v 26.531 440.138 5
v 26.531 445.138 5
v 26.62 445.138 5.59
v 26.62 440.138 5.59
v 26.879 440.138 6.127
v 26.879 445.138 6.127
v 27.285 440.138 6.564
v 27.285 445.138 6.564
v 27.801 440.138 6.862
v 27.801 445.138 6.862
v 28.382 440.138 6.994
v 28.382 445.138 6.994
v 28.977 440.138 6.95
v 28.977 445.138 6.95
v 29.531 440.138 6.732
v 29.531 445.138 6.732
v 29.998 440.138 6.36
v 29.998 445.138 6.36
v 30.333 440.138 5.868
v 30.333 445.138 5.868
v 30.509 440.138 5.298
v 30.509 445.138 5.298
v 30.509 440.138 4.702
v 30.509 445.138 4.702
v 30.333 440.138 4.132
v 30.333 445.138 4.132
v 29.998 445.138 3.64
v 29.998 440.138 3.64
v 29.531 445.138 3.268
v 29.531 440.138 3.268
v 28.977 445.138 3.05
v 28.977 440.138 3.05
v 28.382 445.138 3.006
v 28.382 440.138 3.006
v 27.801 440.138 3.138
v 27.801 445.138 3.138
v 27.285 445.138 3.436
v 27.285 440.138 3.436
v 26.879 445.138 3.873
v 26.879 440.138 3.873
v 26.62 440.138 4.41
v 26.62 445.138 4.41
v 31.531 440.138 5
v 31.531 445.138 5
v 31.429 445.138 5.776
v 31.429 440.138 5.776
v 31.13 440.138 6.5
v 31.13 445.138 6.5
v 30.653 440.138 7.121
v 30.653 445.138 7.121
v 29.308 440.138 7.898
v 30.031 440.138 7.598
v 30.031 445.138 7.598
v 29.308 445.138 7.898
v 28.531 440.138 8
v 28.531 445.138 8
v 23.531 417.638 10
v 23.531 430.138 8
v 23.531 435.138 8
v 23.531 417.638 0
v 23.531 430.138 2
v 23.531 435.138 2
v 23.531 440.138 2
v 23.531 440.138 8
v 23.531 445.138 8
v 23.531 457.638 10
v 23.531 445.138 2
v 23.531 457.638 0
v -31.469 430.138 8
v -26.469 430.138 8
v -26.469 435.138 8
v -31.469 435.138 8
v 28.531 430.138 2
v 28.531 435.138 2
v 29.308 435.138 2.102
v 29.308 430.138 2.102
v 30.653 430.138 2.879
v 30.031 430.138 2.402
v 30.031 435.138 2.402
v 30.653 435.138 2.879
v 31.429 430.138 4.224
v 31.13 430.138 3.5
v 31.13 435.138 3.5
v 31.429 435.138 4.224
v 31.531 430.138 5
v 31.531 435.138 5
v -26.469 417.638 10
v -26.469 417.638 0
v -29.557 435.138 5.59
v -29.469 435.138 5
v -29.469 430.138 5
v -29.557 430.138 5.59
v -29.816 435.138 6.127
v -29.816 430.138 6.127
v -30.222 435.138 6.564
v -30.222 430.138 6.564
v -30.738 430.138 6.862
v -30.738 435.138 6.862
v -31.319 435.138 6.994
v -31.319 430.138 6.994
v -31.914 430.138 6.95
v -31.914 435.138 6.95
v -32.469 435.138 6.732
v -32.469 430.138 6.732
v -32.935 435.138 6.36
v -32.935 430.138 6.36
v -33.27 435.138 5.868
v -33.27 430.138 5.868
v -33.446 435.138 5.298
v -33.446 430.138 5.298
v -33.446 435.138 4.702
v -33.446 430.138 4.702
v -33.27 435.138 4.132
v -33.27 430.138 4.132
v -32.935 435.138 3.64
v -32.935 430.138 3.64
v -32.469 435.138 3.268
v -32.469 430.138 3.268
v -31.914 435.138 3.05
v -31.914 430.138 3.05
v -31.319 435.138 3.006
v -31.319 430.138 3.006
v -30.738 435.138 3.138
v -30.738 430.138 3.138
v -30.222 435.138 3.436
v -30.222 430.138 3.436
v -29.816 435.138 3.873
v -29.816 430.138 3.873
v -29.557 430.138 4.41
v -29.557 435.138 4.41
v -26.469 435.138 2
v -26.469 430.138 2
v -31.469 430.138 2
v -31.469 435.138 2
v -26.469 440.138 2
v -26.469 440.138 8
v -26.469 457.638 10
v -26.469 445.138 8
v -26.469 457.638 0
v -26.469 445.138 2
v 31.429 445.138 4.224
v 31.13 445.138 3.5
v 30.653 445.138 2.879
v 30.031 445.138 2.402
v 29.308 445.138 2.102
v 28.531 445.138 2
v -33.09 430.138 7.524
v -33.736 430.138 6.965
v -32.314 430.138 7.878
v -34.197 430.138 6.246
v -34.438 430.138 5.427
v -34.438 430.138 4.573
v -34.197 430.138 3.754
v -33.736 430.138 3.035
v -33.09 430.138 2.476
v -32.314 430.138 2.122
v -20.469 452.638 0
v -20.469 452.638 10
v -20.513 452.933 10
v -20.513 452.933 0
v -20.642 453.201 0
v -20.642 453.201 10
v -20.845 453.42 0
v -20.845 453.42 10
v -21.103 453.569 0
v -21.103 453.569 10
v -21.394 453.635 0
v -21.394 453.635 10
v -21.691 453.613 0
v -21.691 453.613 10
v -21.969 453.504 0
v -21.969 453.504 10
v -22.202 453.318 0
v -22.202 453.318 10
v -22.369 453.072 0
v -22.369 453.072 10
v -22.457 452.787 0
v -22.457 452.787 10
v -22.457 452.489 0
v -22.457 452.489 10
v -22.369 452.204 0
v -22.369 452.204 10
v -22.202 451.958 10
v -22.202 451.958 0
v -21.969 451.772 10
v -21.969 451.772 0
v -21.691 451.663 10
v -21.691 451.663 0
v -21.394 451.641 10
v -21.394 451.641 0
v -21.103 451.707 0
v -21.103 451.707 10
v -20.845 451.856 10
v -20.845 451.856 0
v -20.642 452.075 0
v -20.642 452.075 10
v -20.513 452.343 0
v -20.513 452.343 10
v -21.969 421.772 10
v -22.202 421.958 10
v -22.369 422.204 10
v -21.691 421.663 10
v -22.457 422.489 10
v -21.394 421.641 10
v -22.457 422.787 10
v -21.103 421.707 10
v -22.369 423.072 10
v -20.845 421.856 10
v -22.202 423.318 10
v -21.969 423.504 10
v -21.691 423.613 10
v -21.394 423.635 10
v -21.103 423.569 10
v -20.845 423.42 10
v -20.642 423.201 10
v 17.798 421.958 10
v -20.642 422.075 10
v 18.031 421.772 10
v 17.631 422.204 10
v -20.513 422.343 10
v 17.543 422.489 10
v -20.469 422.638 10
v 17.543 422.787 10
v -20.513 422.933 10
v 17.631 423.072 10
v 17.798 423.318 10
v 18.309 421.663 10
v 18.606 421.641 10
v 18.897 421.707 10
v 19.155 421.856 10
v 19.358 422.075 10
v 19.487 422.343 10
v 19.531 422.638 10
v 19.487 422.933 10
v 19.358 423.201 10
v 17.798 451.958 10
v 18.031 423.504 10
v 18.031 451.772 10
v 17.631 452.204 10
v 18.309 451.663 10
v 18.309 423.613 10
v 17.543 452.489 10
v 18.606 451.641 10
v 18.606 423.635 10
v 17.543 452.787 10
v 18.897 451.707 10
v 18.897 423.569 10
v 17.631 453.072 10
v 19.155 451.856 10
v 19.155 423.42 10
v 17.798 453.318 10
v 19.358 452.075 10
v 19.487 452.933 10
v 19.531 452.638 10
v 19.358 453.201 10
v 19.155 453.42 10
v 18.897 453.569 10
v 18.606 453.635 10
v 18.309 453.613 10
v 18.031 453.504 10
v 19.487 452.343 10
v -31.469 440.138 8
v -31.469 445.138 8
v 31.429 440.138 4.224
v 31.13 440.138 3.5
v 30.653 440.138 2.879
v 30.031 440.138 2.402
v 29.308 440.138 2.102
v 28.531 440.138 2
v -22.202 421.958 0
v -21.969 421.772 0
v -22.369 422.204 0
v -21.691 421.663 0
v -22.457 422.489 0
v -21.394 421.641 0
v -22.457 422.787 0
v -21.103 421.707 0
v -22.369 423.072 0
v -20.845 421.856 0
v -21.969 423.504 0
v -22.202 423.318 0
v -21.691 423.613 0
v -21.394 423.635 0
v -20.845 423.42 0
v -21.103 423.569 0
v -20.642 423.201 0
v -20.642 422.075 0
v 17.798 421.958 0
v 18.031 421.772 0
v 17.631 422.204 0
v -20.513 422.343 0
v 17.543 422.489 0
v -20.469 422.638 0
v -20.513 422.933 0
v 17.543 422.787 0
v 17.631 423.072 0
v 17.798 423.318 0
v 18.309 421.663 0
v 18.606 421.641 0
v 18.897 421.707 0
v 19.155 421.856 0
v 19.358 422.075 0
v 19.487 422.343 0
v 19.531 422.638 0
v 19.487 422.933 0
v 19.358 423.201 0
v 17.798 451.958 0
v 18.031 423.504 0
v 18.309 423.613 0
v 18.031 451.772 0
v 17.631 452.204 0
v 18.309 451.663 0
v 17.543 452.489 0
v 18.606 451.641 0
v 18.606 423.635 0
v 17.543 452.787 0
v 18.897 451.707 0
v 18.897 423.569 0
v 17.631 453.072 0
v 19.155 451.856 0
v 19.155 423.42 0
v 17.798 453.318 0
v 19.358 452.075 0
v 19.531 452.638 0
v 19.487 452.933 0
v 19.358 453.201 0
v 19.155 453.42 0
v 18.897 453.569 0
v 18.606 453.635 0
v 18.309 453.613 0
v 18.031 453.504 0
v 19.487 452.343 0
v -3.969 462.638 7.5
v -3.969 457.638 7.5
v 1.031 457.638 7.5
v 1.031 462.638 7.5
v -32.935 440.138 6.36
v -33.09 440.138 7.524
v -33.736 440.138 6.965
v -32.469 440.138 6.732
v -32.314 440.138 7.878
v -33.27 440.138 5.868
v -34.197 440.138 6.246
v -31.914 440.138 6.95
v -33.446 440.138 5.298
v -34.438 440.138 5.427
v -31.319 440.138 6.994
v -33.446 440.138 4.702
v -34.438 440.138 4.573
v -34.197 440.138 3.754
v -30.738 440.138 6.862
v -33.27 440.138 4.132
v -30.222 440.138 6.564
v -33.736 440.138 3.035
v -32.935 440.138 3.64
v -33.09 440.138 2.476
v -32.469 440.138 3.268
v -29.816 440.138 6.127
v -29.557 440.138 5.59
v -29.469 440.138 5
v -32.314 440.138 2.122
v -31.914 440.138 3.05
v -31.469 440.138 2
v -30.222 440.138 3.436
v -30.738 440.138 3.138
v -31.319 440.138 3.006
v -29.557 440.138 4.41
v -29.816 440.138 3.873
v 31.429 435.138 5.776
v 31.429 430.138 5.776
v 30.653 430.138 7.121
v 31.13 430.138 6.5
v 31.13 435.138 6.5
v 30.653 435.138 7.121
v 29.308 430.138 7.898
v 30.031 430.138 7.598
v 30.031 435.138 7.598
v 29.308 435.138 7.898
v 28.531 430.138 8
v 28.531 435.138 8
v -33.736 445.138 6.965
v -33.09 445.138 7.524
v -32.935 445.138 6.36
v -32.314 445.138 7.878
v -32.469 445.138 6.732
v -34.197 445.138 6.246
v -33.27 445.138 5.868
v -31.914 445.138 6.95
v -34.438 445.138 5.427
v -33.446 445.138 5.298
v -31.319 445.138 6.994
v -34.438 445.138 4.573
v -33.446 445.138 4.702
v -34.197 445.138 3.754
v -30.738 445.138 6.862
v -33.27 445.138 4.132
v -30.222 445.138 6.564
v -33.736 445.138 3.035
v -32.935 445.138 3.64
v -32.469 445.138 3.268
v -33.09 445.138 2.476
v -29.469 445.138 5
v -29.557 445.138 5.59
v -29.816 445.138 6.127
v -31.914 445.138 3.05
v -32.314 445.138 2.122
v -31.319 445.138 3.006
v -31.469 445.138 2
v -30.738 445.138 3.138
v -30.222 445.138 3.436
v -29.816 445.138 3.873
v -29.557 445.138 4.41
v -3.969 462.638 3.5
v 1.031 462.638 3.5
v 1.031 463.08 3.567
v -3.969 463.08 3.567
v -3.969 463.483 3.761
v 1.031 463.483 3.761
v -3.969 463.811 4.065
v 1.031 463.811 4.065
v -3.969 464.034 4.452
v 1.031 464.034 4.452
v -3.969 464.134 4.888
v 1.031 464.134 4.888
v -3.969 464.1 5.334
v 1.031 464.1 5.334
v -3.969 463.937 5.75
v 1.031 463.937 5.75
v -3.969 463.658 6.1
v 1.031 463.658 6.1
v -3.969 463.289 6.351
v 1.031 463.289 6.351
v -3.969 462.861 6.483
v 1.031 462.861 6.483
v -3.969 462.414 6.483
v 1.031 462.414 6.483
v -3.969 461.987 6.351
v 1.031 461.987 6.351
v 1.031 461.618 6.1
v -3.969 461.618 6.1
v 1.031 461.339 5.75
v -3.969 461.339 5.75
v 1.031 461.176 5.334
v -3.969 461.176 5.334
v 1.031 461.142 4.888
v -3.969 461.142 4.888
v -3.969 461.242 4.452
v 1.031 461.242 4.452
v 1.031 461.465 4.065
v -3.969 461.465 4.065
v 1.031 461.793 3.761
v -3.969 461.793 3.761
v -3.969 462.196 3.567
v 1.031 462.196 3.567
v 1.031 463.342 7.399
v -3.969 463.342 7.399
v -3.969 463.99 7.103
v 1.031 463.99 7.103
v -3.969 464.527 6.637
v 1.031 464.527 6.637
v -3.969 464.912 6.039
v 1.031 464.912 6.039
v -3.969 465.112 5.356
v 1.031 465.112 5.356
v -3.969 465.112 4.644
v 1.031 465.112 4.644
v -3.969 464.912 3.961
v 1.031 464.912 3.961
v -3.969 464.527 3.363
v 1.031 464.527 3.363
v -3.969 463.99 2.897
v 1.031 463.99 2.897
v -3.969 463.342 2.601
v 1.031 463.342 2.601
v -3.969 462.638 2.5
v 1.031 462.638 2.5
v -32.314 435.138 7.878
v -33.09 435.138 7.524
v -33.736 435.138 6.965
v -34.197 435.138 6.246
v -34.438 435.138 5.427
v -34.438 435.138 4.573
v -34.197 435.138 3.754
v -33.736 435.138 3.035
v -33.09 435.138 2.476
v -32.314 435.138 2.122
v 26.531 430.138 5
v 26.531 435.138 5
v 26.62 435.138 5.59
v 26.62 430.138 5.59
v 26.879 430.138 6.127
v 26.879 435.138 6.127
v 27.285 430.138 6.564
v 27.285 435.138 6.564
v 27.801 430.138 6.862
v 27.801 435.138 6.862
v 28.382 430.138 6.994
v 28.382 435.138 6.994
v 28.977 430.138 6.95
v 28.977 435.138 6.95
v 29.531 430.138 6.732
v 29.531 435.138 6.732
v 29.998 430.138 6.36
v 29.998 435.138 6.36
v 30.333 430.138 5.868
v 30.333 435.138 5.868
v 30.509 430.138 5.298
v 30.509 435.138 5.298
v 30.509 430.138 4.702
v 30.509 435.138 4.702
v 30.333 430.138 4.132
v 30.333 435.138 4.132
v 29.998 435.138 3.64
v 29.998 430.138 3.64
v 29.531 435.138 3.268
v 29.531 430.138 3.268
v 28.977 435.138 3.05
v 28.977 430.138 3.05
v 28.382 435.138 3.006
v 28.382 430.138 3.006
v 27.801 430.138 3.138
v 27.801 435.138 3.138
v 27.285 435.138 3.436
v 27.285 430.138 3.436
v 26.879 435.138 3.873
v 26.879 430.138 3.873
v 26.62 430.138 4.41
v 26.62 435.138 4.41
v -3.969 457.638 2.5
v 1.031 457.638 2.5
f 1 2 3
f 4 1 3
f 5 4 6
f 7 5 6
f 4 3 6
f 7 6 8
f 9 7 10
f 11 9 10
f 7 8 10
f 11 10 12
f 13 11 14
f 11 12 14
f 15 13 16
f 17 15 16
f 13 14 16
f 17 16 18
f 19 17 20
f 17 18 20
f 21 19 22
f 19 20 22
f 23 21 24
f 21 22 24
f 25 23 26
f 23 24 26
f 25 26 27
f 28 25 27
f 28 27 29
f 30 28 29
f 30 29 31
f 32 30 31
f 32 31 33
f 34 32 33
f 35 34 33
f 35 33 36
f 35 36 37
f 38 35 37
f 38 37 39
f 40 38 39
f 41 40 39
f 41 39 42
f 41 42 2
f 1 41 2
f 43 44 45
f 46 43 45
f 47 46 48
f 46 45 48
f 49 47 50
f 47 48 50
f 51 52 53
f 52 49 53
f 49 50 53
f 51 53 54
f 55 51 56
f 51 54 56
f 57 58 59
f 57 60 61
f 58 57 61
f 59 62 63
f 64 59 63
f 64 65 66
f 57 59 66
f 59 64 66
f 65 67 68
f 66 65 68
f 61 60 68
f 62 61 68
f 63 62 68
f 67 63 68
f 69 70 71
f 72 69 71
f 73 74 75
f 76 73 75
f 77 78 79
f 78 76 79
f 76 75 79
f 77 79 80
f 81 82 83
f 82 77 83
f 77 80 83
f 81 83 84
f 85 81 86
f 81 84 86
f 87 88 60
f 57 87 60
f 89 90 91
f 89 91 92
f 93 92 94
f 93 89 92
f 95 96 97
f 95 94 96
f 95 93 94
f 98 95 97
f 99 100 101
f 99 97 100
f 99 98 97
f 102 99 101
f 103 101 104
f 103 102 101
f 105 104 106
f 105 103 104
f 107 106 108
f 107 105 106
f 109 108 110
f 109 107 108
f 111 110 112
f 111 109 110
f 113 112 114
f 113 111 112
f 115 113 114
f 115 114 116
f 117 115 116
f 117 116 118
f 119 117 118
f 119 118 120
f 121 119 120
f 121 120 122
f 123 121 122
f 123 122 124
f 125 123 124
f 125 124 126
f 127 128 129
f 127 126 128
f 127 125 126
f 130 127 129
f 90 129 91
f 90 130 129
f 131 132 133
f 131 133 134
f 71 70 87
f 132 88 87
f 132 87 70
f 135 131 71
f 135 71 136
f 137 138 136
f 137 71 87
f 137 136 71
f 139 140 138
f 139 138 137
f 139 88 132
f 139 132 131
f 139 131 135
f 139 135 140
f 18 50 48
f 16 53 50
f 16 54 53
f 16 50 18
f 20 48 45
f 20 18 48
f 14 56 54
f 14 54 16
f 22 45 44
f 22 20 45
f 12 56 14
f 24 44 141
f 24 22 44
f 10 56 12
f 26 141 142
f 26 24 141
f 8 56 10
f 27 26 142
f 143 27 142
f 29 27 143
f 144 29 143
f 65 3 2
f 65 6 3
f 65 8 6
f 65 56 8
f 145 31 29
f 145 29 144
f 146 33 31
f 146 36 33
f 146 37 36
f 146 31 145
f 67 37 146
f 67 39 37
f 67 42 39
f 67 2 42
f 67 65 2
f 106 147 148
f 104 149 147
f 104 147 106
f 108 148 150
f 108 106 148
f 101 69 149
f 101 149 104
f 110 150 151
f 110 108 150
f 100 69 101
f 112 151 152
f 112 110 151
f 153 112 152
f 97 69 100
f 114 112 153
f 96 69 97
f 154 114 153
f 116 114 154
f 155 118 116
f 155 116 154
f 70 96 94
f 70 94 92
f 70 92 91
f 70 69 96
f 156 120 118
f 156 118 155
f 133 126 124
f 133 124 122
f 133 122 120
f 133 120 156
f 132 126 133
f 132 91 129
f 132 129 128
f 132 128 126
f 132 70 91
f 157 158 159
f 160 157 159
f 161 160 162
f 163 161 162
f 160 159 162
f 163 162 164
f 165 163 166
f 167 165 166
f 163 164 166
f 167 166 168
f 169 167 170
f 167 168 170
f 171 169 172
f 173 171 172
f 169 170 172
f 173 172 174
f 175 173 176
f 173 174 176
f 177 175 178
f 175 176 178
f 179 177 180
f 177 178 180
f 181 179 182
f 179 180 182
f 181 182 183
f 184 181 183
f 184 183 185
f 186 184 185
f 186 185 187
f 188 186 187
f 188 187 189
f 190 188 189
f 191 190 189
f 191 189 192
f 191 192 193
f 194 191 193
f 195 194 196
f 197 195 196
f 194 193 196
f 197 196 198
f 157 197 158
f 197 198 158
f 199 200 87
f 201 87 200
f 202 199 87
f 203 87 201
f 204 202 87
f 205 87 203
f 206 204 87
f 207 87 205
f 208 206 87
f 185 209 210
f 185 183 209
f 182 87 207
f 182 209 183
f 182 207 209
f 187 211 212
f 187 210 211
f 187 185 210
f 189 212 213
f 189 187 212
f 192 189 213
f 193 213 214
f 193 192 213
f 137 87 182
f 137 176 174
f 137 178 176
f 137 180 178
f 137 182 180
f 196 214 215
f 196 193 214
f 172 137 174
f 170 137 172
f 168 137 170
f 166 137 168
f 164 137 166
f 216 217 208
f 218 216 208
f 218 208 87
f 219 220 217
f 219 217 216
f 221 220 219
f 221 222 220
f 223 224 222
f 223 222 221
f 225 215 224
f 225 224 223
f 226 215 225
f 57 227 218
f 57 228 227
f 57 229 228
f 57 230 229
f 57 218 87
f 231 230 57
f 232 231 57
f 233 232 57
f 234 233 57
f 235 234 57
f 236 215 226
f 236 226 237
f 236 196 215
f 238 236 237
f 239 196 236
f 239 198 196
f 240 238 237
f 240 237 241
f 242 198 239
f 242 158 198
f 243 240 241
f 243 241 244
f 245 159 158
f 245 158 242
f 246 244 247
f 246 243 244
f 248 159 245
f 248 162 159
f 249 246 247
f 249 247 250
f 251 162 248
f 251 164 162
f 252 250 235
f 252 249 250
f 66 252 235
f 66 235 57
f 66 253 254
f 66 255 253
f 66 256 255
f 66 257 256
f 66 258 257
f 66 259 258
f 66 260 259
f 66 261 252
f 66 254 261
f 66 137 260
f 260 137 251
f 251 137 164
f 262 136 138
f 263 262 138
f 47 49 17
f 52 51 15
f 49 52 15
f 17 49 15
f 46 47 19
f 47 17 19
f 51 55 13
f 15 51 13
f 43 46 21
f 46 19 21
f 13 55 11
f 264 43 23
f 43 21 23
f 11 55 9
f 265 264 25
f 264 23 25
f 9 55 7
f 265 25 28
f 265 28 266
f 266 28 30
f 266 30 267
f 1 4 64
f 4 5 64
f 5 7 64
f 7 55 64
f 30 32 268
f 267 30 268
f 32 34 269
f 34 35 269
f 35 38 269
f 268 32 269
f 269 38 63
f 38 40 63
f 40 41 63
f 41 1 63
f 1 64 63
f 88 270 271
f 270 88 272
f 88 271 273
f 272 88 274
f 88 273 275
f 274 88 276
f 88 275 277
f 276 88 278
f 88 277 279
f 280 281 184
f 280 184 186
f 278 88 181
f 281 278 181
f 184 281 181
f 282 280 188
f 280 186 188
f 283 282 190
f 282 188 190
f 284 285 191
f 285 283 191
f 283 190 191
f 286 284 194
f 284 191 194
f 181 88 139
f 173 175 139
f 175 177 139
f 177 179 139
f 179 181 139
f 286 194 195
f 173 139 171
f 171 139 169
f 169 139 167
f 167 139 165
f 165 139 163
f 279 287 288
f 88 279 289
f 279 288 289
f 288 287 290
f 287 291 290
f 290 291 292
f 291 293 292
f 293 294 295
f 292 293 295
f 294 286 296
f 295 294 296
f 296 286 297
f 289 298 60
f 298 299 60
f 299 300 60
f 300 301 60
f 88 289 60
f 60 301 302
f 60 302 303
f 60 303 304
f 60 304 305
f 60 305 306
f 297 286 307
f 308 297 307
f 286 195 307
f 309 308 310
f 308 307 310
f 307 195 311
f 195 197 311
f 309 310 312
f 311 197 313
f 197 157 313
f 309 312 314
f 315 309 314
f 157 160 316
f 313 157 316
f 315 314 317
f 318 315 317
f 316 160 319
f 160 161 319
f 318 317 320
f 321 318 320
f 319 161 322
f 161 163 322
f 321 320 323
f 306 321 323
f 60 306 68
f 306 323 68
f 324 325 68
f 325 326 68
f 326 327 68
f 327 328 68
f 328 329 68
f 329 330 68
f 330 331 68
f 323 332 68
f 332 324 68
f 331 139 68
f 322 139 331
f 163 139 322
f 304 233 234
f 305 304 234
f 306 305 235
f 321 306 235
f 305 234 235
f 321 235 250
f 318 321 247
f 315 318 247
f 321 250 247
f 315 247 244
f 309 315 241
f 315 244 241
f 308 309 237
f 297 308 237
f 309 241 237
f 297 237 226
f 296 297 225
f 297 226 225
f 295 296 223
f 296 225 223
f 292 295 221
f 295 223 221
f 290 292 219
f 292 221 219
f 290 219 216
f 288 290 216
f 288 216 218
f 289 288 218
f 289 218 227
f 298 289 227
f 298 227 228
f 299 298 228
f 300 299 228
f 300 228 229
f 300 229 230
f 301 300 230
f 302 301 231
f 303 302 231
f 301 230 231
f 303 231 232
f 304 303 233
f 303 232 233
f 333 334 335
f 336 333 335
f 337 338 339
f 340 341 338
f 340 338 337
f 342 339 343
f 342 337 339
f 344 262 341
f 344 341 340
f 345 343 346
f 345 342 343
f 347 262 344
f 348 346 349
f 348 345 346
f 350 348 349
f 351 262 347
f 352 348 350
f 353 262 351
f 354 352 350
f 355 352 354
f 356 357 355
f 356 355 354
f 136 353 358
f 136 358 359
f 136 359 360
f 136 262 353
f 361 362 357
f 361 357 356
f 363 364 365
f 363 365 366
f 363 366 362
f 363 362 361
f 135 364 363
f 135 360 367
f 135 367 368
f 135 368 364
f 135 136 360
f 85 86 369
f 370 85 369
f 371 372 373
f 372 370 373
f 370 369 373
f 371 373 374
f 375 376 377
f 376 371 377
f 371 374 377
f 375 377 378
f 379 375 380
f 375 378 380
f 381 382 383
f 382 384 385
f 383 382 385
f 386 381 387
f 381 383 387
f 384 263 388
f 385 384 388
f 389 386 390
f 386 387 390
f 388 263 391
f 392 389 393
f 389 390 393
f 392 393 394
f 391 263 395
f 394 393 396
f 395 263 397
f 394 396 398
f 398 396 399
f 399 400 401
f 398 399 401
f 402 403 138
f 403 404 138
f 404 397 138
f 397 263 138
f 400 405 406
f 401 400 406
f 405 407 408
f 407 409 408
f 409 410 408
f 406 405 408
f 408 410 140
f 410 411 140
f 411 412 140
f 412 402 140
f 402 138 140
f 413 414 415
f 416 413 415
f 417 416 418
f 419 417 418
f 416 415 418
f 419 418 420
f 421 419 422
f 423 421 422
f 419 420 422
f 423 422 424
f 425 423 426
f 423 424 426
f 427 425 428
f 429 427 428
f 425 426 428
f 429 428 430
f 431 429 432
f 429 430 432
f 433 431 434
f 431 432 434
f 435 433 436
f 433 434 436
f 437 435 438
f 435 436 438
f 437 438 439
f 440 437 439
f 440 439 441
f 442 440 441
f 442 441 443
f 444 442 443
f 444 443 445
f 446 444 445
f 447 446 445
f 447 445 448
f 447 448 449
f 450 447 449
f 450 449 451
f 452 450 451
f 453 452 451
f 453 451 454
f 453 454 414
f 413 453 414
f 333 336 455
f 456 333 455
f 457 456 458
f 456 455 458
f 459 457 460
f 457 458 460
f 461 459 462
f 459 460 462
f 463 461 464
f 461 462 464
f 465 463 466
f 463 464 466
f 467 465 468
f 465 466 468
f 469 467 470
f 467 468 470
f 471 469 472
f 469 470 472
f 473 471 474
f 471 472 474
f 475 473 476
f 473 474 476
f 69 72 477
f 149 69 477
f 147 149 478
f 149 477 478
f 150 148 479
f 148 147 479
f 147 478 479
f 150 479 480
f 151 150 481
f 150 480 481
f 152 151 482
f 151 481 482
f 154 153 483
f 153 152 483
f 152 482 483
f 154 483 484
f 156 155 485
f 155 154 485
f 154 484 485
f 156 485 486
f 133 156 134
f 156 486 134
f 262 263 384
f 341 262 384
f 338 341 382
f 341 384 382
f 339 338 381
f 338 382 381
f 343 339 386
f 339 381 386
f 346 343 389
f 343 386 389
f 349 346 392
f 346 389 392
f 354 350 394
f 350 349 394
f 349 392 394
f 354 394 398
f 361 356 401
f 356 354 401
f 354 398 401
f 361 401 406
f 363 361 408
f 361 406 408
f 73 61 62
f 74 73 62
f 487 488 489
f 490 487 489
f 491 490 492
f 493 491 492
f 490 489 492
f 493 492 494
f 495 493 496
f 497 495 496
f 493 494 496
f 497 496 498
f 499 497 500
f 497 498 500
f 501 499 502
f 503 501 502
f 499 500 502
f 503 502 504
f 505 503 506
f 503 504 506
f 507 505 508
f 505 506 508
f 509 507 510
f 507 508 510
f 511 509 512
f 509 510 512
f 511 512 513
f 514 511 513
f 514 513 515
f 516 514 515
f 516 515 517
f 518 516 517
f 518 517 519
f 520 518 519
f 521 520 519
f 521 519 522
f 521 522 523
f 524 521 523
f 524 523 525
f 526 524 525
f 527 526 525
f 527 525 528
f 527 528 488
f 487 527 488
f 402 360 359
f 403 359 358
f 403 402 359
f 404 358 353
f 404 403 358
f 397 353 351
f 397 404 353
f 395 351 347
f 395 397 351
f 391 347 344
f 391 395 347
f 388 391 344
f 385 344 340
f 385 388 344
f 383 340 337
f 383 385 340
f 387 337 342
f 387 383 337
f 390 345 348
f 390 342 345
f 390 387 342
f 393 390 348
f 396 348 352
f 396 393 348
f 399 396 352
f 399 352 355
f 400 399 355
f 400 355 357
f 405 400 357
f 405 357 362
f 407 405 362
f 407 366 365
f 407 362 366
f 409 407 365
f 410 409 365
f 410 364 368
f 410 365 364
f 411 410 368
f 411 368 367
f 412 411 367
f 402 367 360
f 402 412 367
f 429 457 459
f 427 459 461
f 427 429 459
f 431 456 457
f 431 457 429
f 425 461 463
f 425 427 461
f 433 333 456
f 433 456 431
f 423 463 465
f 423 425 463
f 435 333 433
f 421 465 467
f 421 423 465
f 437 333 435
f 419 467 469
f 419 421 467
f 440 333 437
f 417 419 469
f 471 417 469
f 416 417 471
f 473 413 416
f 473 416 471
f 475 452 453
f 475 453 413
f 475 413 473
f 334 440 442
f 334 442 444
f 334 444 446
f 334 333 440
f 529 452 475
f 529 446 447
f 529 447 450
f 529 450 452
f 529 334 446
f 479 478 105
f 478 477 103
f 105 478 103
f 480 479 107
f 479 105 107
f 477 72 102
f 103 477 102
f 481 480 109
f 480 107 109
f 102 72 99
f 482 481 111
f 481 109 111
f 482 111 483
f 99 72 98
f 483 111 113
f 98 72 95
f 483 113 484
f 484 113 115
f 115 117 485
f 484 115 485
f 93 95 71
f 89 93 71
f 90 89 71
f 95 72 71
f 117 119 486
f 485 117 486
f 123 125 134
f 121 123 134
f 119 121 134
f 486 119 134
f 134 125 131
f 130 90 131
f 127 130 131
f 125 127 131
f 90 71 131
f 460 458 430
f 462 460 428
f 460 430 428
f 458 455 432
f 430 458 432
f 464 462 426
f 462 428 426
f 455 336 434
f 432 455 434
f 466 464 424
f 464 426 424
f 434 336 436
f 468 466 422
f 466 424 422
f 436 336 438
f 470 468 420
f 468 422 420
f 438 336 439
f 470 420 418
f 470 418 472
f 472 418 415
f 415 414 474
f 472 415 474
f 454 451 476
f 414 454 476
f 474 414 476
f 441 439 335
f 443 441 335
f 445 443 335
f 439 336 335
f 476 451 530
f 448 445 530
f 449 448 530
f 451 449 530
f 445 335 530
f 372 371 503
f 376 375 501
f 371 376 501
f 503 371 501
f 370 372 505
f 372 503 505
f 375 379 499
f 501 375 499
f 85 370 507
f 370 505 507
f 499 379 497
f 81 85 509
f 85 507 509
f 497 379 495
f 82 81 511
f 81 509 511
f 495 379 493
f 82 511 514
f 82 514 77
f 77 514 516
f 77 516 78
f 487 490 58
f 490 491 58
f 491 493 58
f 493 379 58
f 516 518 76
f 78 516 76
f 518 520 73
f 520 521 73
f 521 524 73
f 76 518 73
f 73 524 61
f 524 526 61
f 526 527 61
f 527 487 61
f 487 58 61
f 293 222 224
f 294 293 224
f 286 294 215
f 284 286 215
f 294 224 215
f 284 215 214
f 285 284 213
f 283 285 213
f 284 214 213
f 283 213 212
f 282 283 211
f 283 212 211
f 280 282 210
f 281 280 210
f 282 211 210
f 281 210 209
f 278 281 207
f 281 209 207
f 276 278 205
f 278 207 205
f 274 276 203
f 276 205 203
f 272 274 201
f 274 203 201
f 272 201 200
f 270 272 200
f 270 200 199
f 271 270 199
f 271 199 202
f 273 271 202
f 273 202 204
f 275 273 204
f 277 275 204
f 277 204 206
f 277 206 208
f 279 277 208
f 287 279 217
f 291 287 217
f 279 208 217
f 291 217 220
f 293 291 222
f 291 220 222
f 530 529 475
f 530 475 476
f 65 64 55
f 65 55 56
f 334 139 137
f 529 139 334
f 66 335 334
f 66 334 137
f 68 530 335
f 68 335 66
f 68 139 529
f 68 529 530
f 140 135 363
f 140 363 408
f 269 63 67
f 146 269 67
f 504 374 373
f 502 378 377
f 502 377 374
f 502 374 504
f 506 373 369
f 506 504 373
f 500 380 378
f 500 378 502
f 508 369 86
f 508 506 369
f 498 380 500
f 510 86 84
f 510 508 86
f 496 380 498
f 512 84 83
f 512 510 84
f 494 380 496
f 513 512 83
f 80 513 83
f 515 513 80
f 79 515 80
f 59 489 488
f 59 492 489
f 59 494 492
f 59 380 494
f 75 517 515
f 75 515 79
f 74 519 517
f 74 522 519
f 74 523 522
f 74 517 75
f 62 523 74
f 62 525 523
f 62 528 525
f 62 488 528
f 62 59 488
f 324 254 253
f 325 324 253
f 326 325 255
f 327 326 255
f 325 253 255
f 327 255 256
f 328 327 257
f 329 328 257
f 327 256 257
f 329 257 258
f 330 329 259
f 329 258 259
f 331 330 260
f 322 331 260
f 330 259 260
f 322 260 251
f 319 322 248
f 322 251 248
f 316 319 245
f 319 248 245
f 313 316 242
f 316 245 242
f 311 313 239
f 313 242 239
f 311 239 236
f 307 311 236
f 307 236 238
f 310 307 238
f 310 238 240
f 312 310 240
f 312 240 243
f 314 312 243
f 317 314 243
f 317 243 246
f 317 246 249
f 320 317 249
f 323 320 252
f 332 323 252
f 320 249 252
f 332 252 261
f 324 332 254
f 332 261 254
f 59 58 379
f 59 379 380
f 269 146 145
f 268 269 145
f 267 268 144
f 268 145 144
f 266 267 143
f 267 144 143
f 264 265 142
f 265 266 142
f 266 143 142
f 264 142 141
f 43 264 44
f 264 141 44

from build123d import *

# Parameters (mm, degrees)
SKETCH1_W           = 50
SKETCH1_H           = 40
BOSS_EXTRUDE1_DEPTH = 10
SKETCH5_W           = 6
SKETCH5_H           = 5
BOSS_EXTRUDE3_DEPTH = 10
SKETCH6_R           = 2
CUT_EXTRUDE1_DEPTH  = 20
SKETCH8_W           = 10
SKETCH8_H           = 40
CUT_EXTRUDE2_DEPTH  = 25
SKETCH12_W          = 5
SKETCH12_H          = 5
BOSS_EXTRUDE5_DEPTH = 10
SKETCH13_R          = 1.5
CUT_EXTRUDE4_DEPTH  = 10
SKETCH14_R          = 1
CUT_EXTRUDE5_DEPTH  = 10
CUT_EXTRUDE6_DEPTH  = 22
CUT_EXTRUDE7_DEPTH  = 30
CUT_EXTRUDE8_DEPTH  = 30


with BuildPart() as part:
    # Sketch1 → Boss-Extrude1 (new body)
    with BuildSketch(Plane(origin=(669.84184187, 0, 0), x_dir=(1, 0, 0), z_dir=(0, 0, 1))):
        with Locations((-671.310344828, 437.637931034)):
            Rectangle(SKETCH1_W, SKETCH1_H)
    boss_extrude1 = extrude(amount=BOSS_EXTRUDE1_DEPTH)

    # Sketch5 → Boss-Extrude3 (add)
    with BuildSketch(Plane(origin=(23.531497042, 0, 0), x_dir=(0, 0, -1), z_dir=(1, 0, 0))):
        with Locations((-5, 442.637931034)):
            Rectangle(SKETCH5_W, SKETCH5_H)
        with Locations((-5, 432.637931034)):
            Rectangle(SKETCH5_W, SKETCH5_H)
    boss_extrude3 = extrude(amount=BOSS_EXTRUDE3_DEPTH)

    # Sketch6 → Cut-Extrude1 (cut)
    with BuildSketch(Plane(origin=(669.84184187, 445.137931034, 0), x_dir=(1, 0, 0), z_dir=(0, 1, 0))):
        with Locations(Location((-641.310344828, -5, 0), (0, 0, 180))):
            Circle(SKETCH6_R)
    cut_extrude1 = extrude(amount=-CUT_EXTRUDE1_DEPTH, mode=Mode.SUBTRACT)

    # Sketch8 → Cut-Extrude2 (cut)
    with BuildSketch(Plane.ZY.offset(26.468502958)):
        with Locations((5, 437.637931034)):
            Rectangle(SKETCH8_W, SKETCH8_H)
    extrude(amount=-CUT_EXTRUDE2_DEPTH, mode=Mode.SUBTRACT)

    # Mirror1: Boss-Extrude1, Boss-Extrude3, Cut-Extrude1 across plane
    add(boss_extrude1.mirror(Plane(origin=(-1.468502958, 0, 0), x_dir=(0, 0, 1), z_dir=(1, 0, 0))))
    add(boss_extrude3.mirror(Plane(origin=(-1.468502958, 0, 0), x_dir=(0, 0, 1), z_dir=(1, 0, 0))))
    add(cut_extrude1.mirror(Plane(origin=(-1.468502958, 0, 0), x_dir=(0, 0, 1), z_dir=(1, 0, 0))), mode=Mode.SUBTRACT)

    # Sketch12 → Boss-Extrude5 (add)
    with BuildSketch(Plane(origin=(0, 457.637931034, 0), x_dir=(1, 0, 0), z_dir=(0, 1, 0))):
        with Locations((-1.468502958, -5)):
            Rectangle(SKETCH12_W, SKETCH12_H)
    extrude(amount=BOSS_EXTRUDE5_DEPTH)

    # Sketch13 → Cut-Extrude4 (cut)
    with BuildSketch(Plane(origin=(1.031497042, 0, 0), x_dir=(0, 0, -1), z_dir=(1, 0, 0))):
        with Locations((-5, 462.637931034)):
            Circle(SKETCH13_R)
    extrude(amount=-CUT_EXTRUDE4_DEPTH, mode=Mode.SUBTRACT)

    # Sketch14 → Cut-Extrude5 (cut)
    with BuildSketch(Plane.XY.offset(10)):
        with Locations((-21.468502958, 452.637931034)):
            Circle(SKETCH14_R)
        with Locations((-21.468502958, 422.637931034)):
            Circle(SKETCH14_R)
        with Locations((18.531497042, 452.637931034)):
            Circle(SKETCH14_R)
        with Locations((18.531497042, 422.637931034)):
            Circle(SKETCH14_R)
    extrude(amount=-CUT_EXTRUDE5_DEPTH, mode=Mode.SUBTRACT)

    # Sketch15 → Cut-Extrude6 (cut)
    with BuildSketch(Plane(origin=(0, 445.137931034, 0), x_dir=(1, 0, 0), z_dir=(0, 1, 0))):
        with BuildLine():
            Line((33.531497042, -2), (28.531497042, -2))
            ThreePointArc((28.531497042, -2), (30.652817386, -2.878679656), (31.531497042, -5))
            ThreePointArc((31.531497042, -5), (30.652817386, -7.121320344), (28.531497042, -8))
            Line((28.531497042, -8), (33.531497042, -8))
            Line((33.531497042, -8), (33.531497042, -2))
        make_face()
    extrude(amount=-CUT_EXTRUDE6_DEPTH, mode=Mode.SUBTRACT)

    # Sketch17 → Cut-Extrude7 (cut)
    with BuildSketch(Plane(origin=(0, 445.137931034, 0), x_dir=(1, 0, 0), z_dir=(0, 1, 0))):
        with BuildLine():
            Line((-36.468502958, -8), (-31.468502958, -8))
            ThreePointArc((-31.468502958, -8), (-34.468502958, -5), (-31.468502958, -2))
            Line((-31.468502958, -2), (-36.468502958, -2))
            Line((-36.468502958, -2), (-36.468502958, -8))
        make_face()
    extrude(amount=-CUT_EXTRUDE7_DEPTH, mode=Mode.SUBTRACT)

    # Sketch18 → Cut-Extrude8 (cut)
    with BuildSketch(Plane(origin=(1.031497042, 0, 0), x_dir=(0, 0, -1), z_dir=(1, 0, 0))):
        with BuildLine():
            Line((-7.5, 467.637931034), (-7.5, 462.637931034))
            ThreePointArc((-7.5, 462.637931034), (-5, 465.137931034), (-2.5, 462.637931034))
            Line((-2.5, 462.637931034), (-2.5, 467.637931034))
            Line((-2.5, 467.637931034), (-7.5, 467.637931034))
        make_face()
    extrude(amount=-CUT_EXTRUDE8_DEPTH, mode=Mode.SUBTRACT)


solid = part.part
